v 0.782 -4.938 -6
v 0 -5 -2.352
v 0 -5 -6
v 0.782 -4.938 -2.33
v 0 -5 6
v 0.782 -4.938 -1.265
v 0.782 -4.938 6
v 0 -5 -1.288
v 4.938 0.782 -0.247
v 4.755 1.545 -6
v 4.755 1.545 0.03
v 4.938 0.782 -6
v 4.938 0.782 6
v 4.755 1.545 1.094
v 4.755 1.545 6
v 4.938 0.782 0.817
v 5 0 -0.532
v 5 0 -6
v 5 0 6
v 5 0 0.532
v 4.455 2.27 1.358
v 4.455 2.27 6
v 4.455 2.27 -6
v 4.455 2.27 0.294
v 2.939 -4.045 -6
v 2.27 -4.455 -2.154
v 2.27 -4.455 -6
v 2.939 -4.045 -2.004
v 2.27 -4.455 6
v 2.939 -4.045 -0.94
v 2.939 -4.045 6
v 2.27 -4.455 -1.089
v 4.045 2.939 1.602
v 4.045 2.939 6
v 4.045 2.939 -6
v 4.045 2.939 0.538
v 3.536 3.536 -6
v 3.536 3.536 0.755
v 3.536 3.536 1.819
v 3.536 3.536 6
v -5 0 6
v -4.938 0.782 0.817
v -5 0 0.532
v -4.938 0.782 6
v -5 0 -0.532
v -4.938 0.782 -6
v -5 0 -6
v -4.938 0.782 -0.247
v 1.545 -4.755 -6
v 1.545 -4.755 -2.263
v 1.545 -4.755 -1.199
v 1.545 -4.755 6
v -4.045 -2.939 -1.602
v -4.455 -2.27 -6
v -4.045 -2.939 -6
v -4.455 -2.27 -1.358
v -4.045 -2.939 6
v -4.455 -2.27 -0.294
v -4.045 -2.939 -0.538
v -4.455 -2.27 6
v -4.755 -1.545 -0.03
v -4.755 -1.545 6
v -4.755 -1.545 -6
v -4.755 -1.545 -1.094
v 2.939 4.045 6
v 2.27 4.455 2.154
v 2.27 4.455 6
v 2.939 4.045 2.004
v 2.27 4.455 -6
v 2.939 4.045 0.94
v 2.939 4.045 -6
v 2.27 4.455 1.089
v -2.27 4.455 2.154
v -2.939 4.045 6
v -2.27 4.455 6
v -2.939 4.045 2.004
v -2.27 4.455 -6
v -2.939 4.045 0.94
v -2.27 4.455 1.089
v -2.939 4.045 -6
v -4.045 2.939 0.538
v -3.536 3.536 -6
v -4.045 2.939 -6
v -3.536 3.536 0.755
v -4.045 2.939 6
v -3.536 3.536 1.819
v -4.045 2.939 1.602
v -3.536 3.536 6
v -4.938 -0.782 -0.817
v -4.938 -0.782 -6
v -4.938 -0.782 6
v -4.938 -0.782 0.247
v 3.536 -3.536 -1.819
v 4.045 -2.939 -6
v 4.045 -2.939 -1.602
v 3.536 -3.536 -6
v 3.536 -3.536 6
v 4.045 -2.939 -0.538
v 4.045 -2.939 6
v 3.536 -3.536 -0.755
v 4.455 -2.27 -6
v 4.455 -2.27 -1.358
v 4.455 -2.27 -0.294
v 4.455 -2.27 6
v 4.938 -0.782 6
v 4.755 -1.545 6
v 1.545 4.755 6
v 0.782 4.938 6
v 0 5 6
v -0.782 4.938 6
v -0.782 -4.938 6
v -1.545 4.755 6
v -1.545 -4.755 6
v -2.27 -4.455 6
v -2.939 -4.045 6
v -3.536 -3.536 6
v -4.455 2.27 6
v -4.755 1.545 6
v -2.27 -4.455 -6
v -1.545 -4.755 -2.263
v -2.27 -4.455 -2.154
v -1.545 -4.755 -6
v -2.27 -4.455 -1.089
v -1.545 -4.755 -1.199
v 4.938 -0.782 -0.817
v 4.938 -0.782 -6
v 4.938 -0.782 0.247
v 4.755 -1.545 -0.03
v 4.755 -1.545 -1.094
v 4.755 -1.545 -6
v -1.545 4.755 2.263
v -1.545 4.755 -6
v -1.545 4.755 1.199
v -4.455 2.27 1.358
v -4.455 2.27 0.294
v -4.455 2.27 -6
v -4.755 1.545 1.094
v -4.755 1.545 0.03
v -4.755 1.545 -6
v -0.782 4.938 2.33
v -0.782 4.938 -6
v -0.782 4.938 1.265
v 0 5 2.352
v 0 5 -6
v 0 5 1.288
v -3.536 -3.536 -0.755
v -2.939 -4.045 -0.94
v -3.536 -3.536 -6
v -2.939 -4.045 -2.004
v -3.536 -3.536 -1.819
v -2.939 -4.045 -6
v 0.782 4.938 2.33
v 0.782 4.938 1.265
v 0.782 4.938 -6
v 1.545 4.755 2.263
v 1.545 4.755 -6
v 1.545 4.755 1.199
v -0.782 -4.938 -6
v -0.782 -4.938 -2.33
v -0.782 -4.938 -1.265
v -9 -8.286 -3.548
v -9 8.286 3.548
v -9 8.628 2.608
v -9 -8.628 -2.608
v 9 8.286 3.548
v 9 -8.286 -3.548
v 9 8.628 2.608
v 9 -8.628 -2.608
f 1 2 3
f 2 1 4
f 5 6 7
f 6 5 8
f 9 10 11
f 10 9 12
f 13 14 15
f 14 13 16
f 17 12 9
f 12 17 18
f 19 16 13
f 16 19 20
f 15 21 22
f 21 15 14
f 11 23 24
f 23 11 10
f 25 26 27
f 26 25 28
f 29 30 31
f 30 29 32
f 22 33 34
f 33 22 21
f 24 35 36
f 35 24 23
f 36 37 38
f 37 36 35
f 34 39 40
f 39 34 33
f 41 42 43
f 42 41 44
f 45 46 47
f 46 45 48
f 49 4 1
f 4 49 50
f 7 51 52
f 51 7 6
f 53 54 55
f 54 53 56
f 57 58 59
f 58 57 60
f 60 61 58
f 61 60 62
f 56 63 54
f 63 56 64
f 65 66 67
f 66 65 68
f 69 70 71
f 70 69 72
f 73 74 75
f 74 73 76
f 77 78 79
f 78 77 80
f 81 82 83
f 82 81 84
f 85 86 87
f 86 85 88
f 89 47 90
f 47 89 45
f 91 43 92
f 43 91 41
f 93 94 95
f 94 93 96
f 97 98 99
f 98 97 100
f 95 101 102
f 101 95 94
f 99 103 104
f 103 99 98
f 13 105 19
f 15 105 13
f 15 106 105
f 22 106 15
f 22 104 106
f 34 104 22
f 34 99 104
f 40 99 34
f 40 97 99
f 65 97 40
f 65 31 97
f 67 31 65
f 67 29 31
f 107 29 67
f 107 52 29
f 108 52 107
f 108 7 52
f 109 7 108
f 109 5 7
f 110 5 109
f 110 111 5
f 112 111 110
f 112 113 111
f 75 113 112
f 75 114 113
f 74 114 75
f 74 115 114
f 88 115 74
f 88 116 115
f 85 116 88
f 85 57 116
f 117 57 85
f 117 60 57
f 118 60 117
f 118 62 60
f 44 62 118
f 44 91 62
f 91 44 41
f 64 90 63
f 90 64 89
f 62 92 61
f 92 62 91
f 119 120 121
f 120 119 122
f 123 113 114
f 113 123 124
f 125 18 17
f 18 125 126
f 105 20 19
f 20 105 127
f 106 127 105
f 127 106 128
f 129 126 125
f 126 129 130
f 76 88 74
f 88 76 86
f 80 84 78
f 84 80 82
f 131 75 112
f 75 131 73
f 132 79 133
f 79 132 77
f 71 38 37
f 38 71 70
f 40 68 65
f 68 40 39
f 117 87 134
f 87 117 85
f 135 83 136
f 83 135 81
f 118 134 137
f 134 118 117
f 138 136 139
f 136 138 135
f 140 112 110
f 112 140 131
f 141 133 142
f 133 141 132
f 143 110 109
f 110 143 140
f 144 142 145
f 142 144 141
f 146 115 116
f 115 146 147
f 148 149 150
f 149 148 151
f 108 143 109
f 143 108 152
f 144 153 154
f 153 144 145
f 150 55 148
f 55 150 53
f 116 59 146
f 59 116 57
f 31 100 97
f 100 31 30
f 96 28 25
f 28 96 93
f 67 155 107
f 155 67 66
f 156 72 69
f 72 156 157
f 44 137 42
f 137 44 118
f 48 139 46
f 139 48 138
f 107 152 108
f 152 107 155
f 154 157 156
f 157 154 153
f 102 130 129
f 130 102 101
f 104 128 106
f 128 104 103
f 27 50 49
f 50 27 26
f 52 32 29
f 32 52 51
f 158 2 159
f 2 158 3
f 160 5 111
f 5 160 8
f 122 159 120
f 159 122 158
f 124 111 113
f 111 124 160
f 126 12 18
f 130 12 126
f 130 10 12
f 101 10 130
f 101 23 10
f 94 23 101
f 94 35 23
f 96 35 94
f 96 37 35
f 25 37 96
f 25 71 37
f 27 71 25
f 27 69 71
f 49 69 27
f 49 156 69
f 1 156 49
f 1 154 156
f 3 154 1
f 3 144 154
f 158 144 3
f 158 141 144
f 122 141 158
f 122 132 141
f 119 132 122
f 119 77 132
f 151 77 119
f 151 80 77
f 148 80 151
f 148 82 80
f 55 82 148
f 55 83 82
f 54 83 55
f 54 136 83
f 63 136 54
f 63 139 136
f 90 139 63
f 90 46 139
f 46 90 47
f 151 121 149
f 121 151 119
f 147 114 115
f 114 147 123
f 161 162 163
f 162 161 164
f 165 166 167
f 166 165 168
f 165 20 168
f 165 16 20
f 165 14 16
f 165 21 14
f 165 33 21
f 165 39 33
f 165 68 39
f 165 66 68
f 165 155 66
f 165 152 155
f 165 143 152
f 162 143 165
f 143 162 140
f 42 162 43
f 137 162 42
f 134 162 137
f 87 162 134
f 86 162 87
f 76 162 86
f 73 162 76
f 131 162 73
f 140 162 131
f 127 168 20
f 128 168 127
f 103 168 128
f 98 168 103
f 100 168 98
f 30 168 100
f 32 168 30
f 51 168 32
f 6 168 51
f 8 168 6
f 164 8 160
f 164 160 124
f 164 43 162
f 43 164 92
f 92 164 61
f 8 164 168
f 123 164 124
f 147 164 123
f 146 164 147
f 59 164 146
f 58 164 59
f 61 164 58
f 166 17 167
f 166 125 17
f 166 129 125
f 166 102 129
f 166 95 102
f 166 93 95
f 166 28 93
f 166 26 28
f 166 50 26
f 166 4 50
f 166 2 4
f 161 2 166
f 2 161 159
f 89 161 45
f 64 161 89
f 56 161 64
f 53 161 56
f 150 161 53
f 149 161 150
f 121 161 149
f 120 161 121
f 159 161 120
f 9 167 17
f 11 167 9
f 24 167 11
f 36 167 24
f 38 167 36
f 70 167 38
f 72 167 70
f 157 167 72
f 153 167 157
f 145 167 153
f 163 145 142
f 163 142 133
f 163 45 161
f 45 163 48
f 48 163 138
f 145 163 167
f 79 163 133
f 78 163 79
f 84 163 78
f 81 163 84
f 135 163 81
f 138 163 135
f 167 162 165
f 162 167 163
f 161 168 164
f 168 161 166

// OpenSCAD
module ConvertClipIcon() {
     cylinder(r = 5, h = 12, center = true);
     rotate([20, 0, 0]) cube([18, 18, 1], center = true);
}

ConvertClipIcon($fn = 40);
